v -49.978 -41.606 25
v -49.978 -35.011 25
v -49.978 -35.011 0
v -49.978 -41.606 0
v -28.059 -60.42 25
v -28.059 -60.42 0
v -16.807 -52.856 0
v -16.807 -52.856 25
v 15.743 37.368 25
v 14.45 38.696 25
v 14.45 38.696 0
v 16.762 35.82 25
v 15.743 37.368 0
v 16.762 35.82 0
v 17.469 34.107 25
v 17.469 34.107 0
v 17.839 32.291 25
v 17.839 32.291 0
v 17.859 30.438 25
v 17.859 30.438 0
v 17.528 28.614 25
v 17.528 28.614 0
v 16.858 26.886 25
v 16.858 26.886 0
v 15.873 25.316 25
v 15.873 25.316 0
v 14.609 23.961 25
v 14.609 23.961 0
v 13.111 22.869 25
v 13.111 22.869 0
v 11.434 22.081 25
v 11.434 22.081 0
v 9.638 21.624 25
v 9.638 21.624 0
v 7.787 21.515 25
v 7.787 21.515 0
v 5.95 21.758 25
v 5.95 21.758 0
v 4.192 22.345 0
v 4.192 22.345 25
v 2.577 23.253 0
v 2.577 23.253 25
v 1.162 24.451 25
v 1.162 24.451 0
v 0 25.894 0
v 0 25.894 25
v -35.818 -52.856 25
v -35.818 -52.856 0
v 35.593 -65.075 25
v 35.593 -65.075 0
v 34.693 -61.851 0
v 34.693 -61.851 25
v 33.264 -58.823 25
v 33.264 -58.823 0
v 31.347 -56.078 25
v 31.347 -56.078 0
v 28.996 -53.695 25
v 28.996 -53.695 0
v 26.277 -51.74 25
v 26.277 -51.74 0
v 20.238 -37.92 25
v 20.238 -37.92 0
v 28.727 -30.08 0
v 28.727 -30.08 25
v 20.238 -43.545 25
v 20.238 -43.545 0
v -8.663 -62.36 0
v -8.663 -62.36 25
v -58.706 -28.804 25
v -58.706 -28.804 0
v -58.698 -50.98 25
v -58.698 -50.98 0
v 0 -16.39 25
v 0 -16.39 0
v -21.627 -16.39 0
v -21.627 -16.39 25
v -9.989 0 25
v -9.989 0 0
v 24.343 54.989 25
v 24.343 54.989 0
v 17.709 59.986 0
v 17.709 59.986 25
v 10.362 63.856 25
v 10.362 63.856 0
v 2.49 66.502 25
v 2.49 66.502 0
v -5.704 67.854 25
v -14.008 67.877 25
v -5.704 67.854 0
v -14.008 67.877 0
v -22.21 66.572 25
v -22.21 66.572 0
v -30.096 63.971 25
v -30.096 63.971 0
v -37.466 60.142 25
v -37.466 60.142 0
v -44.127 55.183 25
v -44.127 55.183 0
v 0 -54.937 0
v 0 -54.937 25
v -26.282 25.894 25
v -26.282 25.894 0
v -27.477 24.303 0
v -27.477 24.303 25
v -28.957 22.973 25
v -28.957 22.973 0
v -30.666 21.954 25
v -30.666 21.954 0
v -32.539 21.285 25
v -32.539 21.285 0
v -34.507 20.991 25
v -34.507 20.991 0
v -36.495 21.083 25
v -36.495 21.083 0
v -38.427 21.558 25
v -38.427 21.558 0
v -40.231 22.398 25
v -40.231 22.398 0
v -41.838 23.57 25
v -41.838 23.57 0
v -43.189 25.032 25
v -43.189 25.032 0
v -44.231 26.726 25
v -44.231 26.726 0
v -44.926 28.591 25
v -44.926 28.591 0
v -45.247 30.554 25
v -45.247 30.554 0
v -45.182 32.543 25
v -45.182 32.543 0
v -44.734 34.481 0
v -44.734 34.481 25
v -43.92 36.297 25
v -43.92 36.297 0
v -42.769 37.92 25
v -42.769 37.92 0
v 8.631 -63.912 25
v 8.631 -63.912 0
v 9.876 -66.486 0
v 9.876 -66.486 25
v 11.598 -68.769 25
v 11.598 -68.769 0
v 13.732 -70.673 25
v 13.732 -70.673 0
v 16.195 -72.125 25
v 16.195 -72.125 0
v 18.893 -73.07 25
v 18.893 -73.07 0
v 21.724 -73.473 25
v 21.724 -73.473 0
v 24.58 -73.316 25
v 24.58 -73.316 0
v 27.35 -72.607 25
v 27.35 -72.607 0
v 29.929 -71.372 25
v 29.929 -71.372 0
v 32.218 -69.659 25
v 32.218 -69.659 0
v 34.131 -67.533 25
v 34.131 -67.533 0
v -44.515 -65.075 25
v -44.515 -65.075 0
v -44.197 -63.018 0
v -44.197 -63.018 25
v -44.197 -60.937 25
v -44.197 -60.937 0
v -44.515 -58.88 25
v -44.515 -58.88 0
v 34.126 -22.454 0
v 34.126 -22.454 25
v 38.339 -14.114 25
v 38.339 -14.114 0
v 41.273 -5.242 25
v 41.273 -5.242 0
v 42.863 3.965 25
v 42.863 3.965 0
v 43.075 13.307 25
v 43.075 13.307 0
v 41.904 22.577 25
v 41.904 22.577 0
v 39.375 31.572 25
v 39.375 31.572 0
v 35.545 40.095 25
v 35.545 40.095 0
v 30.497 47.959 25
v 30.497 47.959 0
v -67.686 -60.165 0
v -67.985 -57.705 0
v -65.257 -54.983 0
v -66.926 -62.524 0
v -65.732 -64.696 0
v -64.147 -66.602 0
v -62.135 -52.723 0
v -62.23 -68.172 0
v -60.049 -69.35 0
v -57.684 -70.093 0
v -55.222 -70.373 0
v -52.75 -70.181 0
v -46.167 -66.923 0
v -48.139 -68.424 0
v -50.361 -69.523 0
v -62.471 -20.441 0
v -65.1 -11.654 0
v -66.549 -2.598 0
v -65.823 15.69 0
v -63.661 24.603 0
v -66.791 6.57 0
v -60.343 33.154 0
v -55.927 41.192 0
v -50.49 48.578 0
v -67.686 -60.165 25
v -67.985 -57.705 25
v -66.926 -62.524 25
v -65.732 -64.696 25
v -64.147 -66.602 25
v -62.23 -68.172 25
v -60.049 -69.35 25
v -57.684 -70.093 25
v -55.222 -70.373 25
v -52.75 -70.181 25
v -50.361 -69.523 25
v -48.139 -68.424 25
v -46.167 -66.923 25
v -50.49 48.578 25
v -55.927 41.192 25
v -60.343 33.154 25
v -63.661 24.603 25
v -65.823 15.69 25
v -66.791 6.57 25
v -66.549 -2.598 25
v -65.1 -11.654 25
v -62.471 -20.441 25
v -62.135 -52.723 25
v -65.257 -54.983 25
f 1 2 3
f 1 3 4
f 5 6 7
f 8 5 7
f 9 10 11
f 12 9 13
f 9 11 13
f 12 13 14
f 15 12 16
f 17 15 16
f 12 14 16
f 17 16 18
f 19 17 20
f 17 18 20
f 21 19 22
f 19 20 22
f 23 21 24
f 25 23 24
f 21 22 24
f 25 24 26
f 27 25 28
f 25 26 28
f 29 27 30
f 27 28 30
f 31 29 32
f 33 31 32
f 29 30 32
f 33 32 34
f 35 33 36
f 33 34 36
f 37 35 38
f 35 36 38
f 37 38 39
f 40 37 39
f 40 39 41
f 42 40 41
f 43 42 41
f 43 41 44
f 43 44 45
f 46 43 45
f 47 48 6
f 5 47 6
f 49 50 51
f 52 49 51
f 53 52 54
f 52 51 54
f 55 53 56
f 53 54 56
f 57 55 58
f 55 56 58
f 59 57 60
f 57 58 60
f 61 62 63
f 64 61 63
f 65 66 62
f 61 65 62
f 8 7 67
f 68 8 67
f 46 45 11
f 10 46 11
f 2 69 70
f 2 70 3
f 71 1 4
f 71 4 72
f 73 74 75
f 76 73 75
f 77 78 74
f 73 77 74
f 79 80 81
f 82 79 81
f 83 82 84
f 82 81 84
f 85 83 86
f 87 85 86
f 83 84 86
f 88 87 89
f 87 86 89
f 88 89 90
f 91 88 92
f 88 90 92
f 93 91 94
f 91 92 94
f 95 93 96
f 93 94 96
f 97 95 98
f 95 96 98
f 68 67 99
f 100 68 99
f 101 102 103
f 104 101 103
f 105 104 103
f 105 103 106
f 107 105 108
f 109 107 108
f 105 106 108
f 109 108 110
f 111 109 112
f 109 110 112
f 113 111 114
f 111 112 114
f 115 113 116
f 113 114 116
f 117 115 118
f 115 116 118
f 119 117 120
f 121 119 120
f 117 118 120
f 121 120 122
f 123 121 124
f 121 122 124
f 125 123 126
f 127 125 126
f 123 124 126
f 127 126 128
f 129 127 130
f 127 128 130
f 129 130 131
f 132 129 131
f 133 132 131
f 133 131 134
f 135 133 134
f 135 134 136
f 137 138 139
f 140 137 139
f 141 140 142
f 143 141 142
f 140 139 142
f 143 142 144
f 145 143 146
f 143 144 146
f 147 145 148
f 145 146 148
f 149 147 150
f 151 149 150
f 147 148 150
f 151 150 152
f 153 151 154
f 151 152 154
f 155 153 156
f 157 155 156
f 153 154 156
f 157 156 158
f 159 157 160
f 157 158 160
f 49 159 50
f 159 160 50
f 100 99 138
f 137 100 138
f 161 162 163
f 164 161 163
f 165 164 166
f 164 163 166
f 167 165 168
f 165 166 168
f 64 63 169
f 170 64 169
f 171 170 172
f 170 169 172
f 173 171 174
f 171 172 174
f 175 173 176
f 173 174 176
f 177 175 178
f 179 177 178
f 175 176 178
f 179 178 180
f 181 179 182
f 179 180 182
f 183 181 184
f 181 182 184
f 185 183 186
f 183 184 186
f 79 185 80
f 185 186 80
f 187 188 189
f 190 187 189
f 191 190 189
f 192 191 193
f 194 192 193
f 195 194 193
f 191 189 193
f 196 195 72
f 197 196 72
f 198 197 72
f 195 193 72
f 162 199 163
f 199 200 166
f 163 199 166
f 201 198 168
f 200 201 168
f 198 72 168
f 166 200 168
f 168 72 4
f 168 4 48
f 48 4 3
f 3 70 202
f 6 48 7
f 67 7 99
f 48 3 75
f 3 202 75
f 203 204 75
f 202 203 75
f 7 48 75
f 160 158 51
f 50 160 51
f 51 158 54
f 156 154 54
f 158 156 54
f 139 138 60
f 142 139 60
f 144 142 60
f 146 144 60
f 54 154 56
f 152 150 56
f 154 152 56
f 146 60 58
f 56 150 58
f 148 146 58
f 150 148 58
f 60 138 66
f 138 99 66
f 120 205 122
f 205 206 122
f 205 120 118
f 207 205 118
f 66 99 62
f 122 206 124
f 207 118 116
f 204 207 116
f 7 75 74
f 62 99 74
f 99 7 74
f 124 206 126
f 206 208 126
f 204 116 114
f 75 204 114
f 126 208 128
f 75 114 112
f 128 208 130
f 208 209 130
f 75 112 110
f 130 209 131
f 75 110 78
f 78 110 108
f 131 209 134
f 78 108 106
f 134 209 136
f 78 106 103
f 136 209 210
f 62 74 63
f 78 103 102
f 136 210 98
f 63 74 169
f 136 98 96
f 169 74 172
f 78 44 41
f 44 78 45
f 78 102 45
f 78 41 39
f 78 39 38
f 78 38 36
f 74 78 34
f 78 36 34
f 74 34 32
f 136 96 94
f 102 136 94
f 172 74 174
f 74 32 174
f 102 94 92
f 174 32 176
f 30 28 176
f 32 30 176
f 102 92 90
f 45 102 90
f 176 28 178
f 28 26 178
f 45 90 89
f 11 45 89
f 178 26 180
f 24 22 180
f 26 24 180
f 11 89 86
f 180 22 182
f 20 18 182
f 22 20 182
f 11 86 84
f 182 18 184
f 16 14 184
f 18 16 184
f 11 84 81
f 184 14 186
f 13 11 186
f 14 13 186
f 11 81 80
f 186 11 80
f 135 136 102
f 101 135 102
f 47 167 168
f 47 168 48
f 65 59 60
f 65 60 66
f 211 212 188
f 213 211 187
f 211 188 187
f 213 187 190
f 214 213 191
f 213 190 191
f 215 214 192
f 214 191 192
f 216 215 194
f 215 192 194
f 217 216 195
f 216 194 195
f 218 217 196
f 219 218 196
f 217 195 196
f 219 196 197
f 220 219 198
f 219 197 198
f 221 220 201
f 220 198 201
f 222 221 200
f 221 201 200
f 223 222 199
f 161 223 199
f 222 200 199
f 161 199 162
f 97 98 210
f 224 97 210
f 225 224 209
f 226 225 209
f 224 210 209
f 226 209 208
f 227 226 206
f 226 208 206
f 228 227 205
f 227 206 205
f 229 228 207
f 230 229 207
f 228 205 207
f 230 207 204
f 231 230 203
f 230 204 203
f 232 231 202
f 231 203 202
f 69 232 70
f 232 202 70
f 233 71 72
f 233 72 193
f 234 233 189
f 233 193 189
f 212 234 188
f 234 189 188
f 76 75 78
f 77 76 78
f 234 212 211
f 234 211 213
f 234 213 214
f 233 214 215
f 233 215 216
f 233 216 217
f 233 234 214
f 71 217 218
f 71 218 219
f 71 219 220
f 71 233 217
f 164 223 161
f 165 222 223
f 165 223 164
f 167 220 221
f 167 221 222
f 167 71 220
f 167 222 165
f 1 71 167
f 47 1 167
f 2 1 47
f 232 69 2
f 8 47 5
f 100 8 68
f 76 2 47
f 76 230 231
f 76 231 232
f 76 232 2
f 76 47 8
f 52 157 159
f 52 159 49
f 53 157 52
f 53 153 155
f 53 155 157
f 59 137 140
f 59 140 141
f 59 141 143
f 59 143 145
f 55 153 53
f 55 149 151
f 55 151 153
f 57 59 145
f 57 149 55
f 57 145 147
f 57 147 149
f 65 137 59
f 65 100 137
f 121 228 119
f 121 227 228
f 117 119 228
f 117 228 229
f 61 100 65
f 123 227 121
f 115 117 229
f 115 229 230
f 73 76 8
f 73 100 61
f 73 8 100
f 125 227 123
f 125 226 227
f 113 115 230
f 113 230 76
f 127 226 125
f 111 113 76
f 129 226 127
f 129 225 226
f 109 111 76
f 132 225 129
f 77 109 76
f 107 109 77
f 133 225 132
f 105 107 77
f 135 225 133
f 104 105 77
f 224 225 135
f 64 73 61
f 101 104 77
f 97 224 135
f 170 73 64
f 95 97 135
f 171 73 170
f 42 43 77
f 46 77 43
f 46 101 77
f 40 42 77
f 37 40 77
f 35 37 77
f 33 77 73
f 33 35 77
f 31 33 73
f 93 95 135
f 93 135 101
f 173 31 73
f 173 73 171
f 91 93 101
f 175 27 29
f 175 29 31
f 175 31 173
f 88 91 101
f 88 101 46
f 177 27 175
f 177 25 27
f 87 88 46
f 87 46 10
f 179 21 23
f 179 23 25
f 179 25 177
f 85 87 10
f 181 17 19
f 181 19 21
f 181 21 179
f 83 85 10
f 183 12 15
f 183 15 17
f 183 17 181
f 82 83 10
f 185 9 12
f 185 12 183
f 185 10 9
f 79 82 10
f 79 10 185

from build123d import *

# Parameters (mm, degrees)
F1_DEPTH = 8
F2_DEPTH = 25


with BuildPart() as f1:
    # F0 (on Top) → F1 (new body)
    with BuildSketch(Plane.XY):
        with BuildLine():
            Line((-49.977526, -41.605607), (-58.697784, -50.980339))
            ThreePointArc((-58.697784, -50.980339), (-55.746943, -49.98082), (-52.693043, -49.364224))
            ThreePointArc((-52.693043, -49.364224), (-47.439924, -53.121601), (-44.515088, -58.879941))
            Line((-44.515088, -58.879941), (-35.81804, -52.855607))
            Line((-35.81804, -52.855607), (-28.059421, -60.42026))
            Line((-28.059421, -60.42026), (-16.80702, -52.855607))
            Line((-16.80702, -52.855607), (-8.662867, -62.359914))
            Line((-8.662867, -62.359914), (0, -54.936784))
            Line((0, -54.936784), (8.631467, -63.911639))
            ThreePointArc((8.631467, -63.911639), (11.744426, -54.491495), (20.237995, -49.364224))
            ThreePointArc((20.237995, -49.364224), (23.355468, -50.303762), (26.277462, -51.740186))
            Line((26.277462, -51.740186), (20.237995, -43.545261))
            Line((20.237995, -43.545261), (20.237995, -37.920259))
            Line((20.237995, -37.920259), (28.72714, -30.080417))
            ThreePointArc((28.72714, -30.080417), (43.074733, 13.306863), (24.342671, 54.989226))
            ThreePointArc((24.342671, 54.989226), (-9.855567, 68.032469), (-44.127155, 55.183191))
            ThreePointArc((-44.127155, 55.183191), (-65.822797, 15.690348), (-58.705974, -28.803879))
            Line((-58.705974, -28.803879), (-49.977526, -35.010777))
            Line((-49.977526, -35.010777), (-49.977526, -41.605607))
        make_face()
        Polygon((0, -16.390087), (-21.627156, -16.390087), (-9.989223, 0), align=None, mode=Mode.SUBTRACT)
        with BuildLine():
            ThreePointArc((-26.282329, 25.894396), (-41.063186, 22.944871), (-42.769399, 37.920259))
            Line((-42.769399, 37.920259), (-26.282329, 25.894396))
        make_face(mode=Mode.SUBTRACT)
        with BuildLine():
            ThreePointArc((14.450433, 38.696121), (14.608633, 23.960948), (0, 25.894396))
            Line((0, 25.894396), (14.450433, 38.696121))
        make_face(mode=Mode.SUBTRACT)
    extrude(amount=F1_DEPTH)

    # F0 (on Top) → F2 (join)
    with BuildSketch(Plane.XY):
        with BuildLine():
            ThreePointArc((-54.989226, -57.375513), (-61.534535, -55.666613), (-67.984916, -57.704747))
            ThreePointArc((-67.984916, -57.704747), (-58.884264, -69.778136), (-44.515088, -65.075435))
            ThreePointArc((-44.515088, -65.075435), (-48.164701, -59.06607), (-54.989226, -57.375513))
        make_face()
        with BuildLine():
            ThreePointArc((-58.697784, -50.980339), (-63.740644, -53.791075), (-67.984916, -57.704747))
            ThreePointArc((-67.984916, -57.704747), (-61.534535, -55.666613), (-54.989226, -57.375513))
            ThreePointArc((-54.989226, -57.375513), (-48.164701, -59.06607), (-44.515088, -65.075435))
            ThreePointArc((-44.515088, -65.075435), (-44.157255, -61.977688), (-44.515088, -58.879941))
            ThreePointArc((-44.515088, -58.879941), (-47.439924, -53.121601), (-52.693043, -49.364224))
            ThreePointArc((-52.693043, -49.364224), (-55.746943, -49.98082), (-58.697784, -50.980339))
        make_face()
        with BuildLine():
            Line((-49.977526, -41.605607), (-58.697784, -50.980339))
            ThreePointArc((-58.697784, -50.980339), (-55.746943, -49.98082), (-52.693043, -49.364224))
            ThreePointArc((-52.693043, -49.364224), (-47.439924, -53.121601), (-44.515088, -58.879941))
            Line((-44.515088, -58.879941), (-35.81804, -52.855607))
            Line((-35.81804, -52.855607), (-28.059421, -60.42026))
            Line((-28.059421, -60.42026), (-16.80702, -52.855607))
            Line((-16.80702, -52.855607), (-8.662867, -62.359914))
            Line((-8.662867, -62.359914), (0, -54.936784))
            Line((0, -54.936784), (8.631467, -63.911639))
            ThreePointArc((8.631467, -63.911639), (11.744426, -54.491495), (20.237995, -49.364224))
            ThreePointArc((20.237995, -49.364224), (23.355468, -50.303762), (26.277462, -51.740186))
            Line((26.277462, -51.740186), (20.237995, -43.545261))
            Line((20.237995, -43.545261), (20.237995, -37.920259))
            Line((20.237995, -37.920259), (28.72714, -30.080417))
            ThreePointArc((28.72714, -30.080417), (43.074733, 13.306863), (24.342671, 54.989226))
            ThreePointArc((24.342671, 54.989226), (-9.855567, 68.032469), (-44.127155, 55.183191))
            ThreePointArc((-44.127155, 55.183191), (-65.822797, 15.690348), (-58.705974, -28.803879))
            Line((-58.705974, -28.803879), (-49.977526, -35.010777))
            Line((-49.977526, -35.010777), (-49.977526, -41.605607))
        make_face()
        Polygon((0, -16.390087), (-21.627156, -16.390087), (-9.989223, 0), align=None, mode=Mode.SUBTRACT)
        with BuildLine():
            ThreePointArc((-26.282329, 25.894396), (-41.063186, 22.944871), (-42.769399, 37.920259))
            Line((-42.769399, 37.920259), (-26.282329, 25.894396))
        make_face(mode=Mode.SUBTRACT)
        with BuildLine():
            ThreePointArc((14.450433, 38.696121), (14.608633, 23.960948), (0, 25.894396))
            Line((0, 25.894396), (14.450433, 38.696121))
        make_face(mode=Mode.SUBTRACT)
        with BuildLine():
            ThreePointArc((22.355094, -58.863486), (14.893383, -59.756716), (8.631467, -63.911639))
            ThreePointArc((8.631467, -63.911639), (21.724486, -73.472528), (35.592671, -65.075435))
            ThreePointArc((35.592671, -65.075435), (29.710772, -60.399159), (22.355094, -58.863486))
        make_face()
        with BuildLine():
            ThreePointArc((20.237995, -49.364224), (11.744426, -54.491495), (8.631467, -63.911639))
            ThreePointArc((8.631467, -63.911639), (14.893383, -59.756716), (22.355094, -58.863486))
            ThreePointArc((22.355094, -58.863486), (29.710772, -60.399159), (35.592671, -65.075435))
            ThreePointArc((35.592671, -65.075435), (32.363421, -57.410047), (26.277462, -51.740186))
            ThreePointArc((26.277462, -51.740186), (23.355468, -50.303762), (20.237995, -49.364224))
        make_face()
    extrude(amount=F2_DEPTH)


solid = f1.part
